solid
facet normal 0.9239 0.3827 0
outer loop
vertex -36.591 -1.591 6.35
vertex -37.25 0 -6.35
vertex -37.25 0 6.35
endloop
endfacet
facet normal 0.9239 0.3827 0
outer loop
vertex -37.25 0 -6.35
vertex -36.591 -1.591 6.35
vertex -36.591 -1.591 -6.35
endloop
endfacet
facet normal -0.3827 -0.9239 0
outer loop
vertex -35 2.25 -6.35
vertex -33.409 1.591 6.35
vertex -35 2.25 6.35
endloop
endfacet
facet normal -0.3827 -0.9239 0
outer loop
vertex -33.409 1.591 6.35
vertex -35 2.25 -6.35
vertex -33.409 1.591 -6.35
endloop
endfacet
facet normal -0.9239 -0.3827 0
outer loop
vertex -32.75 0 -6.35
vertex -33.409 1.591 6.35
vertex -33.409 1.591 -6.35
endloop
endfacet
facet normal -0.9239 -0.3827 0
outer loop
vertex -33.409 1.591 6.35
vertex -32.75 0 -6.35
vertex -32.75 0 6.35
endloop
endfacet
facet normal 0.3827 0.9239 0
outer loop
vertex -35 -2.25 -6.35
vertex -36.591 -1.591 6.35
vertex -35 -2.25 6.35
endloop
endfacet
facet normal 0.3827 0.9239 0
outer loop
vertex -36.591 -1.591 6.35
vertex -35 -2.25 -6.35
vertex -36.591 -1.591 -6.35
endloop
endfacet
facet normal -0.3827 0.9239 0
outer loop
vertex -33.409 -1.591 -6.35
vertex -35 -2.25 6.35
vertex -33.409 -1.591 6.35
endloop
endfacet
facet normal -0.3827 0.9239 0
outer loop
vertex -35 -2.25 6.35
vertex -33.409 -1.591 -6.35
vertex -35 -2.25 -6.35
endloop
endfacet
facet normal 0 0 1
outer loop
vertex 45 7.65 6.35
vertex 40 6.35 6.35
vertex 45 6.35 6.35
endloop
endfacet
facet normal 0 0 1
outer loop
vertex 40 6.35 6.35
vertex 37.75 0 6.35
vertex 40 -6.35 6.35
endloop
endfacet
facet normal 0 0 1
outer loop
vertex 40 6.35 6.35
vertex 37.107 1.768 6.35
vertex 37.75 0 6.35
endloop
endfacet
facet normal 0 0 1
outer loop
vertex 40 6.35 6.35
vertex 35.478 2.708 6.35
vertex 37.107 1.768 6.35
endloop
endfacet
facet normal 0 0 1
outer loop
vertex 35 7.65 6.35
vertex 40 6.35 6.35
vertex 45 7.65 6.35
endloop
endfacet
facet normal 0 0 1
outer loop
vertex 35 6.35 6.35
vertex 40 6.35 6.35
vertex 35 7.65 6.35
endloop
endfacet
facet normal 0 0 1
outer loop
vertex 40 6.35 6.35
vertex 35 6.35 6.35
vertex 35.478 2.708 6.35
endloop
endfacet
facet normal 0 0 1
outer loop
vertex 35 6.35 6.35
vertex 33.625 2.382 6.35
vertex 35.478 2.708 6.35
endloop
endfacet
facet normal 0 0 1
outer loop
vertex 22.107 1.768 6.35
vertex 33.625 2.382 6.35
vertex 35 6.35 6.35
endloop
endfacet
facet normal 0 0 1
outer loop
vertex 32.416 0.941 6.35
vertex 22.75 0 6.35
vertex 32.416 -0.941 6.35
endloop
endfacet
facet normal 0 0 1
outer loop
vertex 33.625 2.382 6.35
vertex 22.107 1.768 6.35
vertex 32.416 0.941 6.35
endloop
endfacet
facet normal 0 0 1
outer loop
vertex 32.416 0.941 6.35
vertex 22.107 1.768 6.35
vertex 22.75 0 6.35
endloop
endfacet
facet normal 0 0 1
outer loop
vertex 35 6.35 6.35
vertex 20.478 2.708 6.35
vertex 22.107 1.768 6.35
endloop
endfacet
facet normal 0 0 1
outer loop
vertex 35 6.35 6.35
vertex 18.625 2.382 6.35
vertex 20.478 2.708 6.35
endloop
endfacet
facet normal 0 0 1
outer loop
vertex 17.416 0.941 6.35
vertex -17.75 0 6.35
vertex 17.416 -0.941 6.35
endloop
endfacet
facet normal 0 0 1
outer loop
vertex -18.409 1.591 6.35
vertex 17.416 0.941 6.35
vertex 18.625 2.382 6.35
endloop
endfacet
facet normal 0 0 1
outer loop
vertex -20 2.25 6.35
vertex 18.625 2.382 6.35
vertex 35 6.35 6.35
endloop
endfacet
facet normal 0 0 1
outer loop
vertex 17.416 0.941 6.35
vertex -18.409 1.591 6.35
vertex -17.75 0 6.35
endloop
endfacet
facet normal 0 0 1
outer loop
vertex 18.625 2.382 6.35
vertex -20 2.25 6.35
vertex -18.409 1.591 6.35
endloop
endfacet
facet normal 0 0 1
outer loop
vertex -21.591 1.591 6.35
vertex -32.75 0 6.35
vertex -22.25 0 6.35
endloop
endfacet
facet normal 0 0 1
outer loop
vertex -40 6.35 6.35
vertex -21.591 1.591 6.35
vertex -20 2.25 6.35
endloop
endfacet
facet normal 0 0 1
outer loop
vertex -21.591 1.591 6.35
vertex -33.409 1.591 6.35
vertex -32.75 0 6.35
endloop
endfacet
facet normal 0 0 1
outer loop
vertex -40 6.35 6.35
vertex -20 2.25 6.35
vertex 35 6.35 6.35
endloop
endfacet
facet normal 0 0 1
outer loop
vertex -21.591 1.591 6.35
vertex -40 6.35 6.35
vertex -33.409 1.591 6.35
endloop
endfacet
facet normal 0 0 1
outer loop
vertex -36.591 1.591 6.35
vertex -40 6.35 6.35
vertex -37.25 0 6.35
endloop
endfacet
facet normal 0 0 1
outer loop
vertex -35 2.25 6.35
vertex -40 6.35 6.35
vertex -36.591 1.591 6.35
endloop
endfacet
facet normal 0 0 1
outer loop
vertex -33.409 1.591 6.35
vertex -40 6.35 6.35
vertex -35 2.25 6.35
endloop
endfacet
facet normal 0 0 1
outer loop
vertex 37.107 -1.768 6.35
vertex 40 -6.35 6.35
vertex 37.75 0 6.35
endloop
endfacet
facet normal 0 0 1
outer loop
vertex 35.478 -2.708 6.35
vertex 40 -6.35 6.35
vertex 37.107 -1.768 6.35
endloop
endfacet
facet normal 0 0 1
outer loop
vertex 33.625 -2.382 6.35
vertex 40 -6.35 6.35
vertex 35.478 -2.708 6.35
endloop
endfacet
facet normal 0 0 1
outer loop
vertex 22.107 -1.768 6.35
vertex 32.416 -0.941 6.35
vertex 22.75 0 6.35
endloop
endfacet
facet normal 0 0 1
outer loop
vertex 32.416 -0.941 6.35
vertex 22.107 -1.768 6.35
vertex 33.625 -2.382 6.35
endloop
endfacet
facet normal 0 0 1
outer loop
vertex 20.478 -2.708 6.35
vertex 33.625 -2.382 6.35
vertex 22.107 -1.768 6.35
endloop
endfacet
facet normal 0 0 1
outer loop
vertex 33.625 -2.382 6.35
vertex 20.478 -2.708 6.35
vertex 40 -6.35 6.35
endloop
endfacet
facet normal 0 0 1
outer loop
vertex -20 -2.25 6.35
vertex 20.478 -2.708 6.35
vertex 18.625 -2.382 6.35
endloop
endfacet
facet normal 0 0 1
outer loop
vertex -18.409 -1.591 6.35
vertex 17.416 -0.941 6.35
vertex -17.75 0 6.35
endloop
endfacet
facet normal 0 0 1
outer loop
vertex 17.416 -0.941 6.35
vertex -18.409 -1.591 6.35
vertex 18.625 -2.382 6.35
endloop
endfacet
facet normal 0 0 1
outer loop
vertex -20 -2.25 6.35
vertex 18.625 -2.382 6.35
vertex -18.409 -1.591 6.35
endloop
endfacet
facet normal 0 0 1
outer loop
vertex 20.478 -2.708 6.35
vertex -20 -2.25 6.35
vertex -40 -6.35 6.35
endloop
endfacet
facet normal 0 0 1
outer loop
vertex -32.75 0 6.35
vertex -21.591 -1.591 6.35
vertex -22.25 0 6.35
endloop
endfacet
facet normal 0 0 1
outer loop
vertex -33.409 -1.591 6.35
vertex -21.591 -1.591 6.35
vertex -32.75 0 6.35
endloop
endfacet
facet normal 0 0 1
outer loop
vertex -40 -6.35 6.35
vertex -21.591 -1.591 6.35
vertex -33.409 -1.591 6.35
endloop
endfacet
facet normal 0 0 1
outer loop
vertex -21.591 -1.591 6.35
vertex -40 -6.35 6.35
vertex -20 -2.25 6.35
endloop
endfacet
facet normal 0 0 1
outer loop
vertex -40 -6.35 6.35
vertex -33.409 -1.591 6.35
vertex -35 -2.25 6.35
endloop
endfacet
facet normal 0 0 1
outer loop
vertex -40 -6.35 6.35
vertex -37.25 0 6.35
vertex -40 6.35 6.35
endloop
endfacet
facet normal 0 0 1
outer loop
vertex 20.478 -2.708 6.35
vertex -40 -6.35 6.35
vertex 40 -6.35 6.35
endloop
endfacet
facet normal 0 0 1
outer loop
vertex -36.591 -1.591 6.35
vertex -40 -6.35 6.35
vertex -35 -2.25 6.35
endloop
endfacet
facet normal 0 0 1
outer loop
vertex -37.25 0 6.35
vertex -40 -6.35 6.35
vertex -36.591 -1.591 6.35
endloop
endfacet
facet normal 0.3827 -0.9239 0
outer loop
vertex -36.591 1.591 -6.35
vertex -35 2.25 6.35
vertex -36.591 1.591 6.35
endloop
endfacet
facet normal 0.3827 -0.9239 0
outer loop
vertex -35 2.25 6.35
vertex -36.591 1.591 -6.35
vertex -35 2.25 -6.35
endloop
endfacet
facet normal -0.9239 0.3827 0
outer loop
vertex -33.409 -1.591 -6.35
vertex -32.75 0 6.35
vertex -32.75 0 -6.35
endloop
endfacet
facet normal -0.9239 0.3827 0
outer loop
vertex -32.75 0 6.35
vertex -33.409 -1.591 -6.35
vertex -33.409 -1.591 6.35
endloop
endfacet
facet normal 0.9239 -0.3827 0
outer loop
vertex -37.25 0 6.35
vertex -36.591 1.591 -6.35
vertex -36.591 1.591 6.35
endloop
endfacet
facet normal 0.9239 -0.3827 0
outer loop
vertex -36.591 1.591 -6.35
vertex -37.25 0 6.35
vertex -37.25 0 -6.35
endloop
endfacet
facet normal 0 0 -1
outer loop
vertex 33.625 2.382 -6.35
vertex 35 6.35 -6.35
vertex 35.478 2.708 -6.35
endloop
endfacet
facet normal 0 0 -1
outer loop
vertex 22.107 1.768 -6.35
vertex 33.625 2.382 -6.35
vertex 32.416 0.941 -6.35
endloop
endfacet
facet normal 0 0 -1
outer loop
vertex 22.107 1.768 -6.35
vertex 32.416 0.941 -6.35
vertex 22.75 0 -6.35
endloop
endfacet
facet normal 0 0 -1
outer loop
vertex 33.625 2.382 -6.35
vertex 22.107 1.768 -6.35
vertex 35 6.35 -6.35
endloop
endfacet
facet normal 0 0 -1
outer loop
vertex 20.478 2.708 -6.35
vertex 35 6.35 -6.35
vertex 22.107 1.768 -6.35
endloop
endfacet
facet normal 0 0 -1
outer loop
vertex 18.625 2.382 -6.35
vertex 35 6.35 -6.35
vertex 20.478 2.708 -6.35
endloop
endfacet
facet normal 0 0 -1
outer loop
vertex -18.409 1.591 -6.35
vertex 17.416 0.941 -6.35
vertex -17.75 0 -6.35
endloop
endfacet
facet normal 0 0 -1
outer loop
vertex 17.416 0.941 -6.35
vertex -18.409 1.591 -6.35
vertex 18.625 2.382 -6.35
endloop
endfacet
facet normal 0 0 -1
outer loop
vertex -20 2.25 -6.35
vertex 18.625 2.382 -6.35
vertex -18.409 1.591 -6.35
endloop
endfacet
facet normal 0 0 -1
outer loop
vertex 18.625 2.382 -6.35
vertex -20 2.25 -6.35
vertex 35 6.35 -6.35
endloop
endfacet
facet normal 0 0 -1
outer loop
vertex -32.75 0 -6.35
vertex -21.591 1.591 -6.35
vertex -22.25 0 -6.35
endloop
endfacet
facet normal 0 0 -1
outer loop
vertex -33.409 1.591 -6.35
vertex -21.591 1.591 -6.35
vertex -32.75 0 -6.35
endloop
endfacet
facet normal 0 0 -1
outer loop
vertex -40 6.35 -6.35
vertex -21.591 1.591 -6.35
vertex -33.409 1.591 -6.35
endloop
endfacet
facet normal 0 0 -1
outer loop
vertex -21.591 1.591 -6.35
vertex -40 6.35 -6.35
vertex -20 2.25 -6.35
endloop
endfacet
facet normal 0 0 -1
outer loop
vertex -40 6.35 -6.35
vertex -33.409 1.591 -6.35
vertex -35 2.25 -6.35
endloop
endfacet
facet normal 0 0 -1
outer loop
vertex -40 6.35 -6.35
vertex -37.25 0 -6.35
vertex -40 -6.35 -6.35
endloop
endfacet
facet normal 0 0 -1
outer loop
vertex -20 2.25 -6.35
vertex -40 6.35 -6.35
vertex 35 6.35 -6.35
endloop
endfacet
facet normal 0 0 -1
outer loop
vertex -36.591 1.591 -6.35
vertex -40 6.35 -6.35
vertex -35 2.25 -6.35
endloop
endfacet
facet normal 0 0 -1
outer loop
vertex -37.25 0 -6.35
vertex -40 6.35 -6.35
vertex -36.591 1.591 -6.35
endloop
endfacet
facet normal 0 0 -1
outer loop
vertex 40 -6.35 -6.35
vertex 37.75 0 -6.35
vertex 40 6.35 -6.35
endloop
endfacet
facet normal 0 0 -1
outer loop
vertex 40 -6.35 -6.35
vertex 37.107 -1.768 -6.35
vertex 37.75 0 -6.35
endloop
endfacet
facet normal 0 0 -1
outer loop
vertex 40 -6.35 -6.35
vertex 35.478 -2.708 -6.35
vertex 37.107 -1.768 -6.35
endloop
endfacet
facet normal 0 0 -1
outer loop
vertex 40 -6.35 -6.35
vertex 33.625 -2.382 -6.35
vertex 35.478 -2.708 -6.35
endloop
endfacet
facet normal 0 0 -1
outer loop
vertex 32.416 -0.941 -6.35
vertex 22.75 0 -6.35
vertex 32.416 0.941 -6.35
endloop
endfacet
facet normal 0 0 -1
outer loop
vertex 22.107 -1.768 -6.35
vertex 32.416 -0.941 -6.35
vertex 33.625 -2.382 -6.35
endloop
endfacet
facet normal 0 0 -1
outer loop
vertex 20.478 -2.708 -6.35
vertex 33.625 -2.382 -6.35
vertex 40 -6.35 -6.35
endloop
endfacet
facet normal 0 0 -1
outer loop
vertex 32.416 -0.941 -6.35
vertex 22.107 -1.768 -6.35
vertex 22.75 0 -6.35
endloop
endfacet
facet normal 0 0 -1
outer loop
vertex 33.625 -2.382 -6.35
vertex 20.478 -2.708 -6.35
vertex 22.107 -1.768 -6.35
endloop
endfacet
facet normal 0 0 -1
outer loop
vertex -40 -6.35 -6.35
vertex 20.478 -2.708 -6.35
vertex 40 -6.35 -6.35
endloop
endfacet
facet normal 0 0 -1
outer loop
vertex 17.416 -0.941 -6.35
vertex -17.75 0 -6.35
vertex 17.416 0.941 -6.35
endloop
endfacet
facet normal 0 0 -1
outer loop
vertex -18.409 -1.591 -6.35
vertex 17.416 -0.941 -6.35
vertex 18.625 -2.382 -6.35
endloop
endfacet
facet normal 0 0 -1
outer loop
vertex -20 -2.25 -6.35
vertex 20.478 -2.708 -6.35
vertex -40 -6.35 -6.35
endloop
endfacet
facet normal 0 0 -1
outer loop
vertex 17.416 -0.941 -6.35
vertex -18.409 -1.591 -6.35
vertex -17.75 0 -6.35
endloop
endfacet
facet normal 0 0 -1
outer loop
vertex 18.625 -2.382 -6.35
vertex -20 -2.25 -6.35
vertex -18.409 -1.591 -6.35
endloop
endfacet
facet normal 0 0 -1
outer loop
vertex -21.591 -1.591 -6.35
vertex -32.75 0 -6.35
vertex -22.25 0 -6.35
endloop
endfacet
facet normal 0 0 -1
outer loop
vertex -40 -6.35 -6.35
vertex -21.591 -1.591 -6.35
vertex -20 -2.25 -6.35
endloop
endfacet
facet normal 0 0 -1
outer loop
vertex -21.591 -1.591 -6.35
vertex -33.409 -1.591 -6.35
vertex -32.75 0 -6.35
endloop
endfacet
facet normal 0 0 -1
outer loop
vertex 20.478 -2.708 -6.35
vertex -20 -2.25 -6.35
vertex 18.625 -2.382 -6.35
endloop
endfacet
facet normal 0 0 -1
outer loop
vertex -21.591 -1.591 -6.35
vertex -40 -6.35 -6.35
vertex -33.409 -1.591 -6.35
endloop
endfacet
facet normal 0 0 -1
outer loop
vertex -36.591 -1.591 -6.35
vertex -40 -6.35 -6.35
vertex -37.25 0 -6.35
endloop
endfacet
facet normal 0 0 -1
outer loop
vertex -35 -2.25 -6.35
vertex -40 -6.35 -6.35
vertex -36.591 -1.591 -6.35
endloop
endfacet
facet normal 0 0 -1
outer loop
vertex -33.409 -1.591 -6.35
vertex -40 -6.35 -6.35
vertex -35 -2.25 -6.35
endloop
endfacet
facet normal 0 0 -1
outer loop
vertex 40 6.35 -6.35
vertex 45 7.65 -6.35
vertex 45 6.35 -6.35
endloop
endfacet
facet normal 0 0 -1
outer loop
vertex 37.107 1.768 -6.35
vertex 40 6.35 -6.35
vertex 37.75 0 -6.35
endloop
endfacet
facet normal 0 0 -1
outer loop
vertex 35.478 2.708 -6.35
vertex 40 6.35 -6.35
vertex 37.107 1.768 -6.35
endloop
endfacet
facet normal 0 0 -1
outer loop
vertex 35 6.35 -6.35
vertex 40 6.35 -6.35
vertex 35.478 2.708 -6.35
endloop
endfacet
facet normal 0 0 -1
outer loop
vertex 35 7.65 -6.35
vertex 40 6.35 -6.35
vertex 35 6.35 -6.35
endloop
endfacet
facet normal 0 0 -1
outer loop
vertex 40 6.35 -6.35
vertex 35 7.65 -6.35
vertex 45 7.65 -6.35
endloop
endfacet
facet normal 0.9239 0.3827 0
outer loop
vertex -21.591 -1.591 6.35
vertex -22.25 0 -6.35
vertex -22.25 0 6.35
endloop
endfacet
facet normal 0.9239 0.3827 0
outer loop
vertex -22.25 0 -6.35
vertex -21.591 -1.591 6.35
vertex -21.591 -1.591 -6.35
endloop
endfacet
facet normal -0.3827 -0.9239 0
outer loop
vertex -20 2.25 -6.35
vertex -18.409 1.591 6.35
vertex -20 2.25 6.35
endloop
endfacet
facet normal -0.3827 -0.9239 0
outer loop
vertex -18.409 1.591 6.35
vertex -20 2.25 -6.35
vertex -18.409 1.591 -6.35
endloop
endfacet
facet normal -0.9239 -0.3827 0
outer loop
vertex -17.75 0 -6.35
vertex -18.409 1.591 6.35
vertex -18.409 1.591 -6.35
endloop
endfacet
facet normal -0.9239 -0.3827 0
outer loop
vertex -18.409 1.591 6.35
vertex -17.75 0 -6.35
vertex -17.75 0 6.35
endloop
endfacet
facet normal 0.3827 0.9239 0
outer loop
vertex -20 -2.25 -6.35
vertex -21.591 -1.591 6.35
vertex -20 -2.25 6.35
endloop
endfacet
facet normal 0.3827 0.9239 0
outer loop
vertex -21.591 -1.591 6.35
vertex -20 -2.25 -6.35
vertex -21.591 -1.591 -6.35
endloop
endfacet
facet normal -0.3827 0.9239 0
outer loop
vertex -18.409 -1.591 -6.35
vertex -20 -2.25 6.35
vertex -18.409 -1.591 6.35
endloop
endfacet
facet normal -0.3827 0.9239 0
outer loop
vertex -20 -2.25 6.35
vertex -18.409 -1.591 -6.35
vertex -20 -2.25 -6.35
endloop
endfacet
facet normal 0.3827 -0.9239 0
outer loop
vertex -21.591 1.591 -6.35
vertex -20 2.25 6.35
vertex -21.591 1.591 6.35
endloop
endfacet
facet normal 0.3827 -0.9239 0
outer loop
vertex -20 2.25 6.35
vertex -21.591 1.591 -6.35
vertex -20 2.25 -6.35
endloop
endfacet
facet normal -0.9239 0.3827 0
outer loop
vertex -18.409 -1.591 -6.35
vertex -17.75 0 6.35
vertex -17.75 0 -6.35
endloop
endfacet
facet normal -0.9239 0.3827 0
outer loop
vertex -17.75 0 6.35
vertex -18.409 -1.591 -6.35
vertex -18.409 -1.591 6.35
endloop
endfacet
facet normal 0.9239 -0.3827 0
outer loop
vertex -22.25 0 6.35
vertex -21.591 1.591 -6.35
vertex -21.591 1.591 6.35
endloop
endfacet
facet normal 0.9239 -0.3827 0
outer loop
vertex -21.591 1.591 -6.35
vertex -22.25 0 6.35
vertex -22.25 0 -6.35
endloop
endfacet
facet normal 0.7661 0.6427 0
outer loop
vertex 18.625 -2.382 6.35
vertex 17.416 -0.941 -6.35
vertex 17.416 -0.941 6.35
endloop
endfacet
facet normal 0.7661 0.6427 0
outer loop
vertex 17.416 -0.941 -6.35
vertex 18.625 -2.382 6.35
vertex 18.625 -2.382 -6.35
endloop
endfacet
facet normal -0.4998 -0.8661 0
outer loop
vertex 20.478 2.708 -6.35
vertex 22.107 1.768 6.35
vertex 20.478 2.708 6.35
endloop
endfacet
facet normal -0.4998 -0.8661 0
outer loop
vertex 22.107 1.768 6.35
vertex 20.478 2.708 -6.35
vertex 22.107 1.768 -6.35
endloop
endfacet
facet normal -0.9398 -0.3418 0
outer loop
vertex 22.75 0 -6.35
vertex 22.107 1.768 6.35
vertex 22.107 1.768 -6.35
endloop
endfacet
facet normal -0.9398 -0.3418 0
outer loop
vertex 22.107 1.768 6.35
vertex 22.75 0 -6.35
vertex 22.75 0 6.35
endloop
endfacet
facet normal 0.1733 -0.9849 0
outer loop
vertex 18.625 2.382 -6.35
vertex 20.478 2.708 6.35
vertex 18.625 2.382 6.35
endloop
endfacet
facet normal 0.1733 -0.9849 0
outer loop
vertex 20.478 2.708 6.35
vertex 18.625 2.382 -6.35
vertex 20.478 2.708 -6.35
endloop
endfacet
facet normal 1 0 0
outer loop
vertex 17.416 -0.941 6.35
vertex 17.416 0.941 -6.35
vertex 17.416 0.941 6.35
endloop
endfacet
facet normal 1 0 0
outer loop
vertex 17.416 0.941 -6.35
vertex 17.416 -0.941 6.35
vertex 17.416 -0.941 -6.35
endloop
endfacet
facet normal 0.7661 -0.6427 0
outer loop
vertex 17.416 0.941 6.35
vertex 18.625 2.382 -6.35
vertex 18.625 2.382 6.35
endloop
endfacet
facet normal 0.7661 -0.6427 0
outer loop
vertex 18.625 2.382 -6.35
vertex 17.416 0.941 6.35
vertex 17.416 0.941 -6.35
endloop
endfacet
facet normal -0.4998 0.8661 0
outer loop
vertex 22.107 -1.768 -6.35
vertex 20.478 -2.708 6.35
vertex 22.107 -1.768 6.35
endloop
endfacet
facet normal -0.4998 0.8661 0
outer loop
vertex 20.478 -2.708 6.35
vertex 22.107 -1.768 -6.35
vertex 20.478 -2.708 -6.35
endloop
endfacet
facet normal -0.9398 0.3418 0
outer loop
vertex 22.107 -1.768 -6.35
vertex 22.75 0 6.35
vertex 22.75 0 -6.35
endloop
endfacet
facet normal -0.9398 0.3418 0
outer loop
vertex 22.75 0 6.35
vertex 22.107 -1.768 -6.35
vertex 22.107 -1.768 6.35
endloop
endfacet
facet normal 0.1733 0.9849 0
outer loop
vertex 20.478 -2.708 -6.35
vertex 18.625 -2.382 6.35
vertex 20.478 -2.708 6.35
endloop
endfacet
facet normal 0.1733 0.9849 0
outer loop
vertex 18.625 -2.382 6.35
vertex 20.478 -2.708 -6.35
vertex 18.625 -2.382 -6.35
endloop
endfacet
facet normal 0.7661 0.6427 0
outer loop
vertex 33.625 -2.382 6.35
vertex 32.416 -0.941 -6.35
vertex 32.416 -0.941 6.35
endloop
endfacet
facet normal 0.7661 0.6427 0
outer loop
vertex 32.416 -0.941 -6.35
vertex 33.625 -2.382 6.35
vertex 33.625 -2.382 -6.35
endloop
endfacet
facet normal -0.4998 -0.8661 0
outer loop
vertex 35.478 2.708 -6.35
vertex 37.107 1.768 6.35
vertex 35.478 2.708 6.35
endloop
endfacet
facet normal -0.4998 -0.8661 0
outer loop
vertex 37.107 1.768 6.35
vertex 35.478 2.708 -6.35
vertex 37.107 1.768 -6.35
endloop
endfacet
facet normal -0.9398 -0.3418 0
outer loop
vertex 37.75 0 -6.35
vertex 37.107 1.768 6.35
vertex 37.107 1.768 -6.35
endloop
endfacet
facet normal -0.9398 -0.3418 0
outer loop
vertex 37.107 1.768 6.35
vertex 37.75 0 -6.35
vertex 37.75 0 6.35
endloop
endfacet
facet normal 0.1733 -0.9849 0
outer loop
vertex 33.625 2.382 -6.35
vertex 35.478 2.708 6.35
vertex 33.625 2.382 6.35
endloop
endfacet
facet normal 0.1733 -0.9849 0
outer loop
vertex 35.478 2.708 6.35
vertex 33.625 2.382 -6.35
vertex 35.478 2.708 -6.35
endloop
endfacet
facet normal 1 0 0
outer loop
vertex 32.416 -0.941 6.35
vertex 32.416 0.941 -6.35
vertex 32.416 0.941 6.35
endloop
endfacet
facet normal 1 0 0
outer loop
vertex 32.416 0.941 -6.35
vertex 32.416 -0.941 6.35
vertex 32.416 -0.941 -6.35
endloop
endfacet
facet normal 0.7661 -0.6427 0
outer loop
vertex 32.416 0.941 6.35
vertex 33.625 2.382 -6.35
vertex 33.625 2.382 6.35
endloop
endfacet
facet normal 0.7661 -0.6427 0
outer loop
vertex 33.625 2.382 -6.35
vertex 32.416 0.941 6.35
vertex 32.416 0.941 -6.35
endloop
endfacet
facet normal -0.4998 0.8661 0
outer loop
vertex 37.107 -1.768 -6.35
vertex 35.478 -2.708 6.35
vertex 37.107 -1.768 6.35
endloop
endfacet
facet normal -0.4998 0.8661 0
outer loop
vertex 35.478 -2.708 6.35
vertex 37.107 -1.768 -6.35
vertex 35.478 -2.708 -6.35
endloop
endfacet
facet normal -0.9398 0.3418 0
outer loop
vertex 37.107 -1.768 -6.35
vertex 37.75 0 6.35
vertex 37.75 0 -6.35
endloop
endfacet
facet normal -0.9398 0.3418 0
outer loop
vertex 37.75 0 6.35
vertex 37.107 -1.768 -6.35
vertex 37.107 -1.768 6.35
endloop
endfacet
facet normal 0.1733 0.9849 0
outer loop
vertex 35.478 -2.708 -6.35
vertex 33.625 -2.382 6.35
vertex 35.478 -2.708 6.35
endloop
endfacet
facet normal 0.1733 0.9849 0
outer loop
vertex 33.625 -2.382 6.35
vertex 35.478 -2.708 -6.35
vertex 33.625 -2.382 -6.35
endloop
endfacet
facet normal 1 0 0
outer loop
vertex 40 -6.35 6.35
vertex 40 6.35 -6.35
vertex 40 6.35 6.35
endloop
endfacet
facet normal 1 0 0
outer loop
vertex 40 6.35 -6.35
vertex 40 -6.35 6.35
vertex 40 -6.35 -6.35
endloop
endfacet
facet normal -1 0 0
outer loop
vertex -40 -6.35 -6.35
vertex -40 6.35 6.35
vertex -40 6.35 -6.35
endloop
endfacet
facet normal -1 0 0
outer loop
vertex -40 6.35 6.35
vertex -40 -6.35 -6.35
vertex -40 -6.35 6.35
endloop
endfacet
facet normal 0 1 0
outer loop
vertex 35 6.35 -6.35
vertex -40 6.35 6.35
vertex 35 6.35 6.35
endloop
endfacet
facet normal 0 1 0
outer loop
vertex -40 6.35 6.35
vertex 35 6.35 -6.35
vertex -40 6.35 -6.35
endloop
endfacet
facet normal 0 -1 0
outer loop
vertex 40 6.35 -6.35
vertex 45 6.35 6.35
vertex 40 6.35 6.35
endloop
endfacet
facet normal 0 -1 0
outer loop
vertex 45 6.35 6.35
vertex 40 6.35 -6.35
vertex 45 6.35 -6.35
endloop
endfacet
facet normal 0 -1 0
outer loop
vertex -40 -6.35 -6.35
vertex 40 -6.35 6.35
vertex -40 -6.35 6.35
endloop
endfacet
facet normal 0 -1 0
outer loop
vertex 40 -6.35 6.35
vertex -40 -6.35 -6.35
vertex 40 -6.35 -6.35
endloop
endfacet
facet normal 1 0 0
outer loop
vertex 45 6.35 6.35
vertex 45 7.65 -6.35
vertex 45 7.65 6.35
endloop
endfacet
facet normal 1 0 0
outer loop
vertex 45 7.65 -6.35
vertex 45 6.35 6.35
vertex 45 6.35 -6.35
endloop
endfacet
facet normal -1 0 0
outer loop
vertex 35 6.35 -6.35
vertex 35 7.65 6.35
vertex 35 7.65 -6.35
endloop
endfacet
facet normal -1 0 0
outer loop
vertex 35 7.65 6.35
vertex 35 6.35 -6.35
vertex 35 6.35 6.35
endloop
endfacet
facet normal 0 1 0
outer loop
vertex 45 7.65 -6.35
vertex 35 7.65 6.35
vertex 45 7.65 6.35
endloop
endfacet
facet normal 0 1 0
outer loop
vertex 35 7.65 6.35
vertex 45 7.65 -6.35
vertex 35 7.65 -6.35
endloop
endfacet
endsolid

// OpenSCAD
/* TAL220 Load Cell - Basic dimensional representation of the TAL220
    Copyright (C) 2019 Benjamin Hubbard

    This program is free software: you can redistribute it and/or modify
    it under the terms of the GNU General Public License as published by
    the Free Software Foundation, either version 3 of the License, or
    (at your option) any later version.

    This program is distributed in the hope that it will be useful,
    but WITHOUT ANY WARRANTY; without even the implied warranty of
    MERCHANTABILITY or FITNESS FOR A PARTICULAR PURPOSE.  See the
    GNU General Public License for more details.

    You should have received a copy of the GNU General Public License
    along with this program.  If not, see <https://www.gnu.org/licenses/>.
 */
 
 TAL220();
 
 module TAL220() {
   // Outer Dimensions (l, w, h)
   dim   = [80, 12.7, 12.7];
   
   // Hole locations.
   holeX = [-35, -20, 20, 35];
   holeY = [0, 0, 0, 0];
   
   // Hole diameters (M4, M4, M5, M5).
   diam  = [4.5, 4.5, 5.5, 5.5];
   
   // Strain gage cables
   cableThickness = 1.3;
   
   // Make the TAL220, centroid at the origin.
   difference() {
     cube(dim, center = true);
     for (i=[0:3]) {
       translate([holeX[i], holeY[i], 0])cylinder(d = diam[i], h = dim[2], center=true);
     }
   }
   
   // Add cable representation.
   translate([dim[0]/2, dim[1]/2 + cableThickness/2, 0])cube([10, cableThickness, dim[2]], center=true);
 }
